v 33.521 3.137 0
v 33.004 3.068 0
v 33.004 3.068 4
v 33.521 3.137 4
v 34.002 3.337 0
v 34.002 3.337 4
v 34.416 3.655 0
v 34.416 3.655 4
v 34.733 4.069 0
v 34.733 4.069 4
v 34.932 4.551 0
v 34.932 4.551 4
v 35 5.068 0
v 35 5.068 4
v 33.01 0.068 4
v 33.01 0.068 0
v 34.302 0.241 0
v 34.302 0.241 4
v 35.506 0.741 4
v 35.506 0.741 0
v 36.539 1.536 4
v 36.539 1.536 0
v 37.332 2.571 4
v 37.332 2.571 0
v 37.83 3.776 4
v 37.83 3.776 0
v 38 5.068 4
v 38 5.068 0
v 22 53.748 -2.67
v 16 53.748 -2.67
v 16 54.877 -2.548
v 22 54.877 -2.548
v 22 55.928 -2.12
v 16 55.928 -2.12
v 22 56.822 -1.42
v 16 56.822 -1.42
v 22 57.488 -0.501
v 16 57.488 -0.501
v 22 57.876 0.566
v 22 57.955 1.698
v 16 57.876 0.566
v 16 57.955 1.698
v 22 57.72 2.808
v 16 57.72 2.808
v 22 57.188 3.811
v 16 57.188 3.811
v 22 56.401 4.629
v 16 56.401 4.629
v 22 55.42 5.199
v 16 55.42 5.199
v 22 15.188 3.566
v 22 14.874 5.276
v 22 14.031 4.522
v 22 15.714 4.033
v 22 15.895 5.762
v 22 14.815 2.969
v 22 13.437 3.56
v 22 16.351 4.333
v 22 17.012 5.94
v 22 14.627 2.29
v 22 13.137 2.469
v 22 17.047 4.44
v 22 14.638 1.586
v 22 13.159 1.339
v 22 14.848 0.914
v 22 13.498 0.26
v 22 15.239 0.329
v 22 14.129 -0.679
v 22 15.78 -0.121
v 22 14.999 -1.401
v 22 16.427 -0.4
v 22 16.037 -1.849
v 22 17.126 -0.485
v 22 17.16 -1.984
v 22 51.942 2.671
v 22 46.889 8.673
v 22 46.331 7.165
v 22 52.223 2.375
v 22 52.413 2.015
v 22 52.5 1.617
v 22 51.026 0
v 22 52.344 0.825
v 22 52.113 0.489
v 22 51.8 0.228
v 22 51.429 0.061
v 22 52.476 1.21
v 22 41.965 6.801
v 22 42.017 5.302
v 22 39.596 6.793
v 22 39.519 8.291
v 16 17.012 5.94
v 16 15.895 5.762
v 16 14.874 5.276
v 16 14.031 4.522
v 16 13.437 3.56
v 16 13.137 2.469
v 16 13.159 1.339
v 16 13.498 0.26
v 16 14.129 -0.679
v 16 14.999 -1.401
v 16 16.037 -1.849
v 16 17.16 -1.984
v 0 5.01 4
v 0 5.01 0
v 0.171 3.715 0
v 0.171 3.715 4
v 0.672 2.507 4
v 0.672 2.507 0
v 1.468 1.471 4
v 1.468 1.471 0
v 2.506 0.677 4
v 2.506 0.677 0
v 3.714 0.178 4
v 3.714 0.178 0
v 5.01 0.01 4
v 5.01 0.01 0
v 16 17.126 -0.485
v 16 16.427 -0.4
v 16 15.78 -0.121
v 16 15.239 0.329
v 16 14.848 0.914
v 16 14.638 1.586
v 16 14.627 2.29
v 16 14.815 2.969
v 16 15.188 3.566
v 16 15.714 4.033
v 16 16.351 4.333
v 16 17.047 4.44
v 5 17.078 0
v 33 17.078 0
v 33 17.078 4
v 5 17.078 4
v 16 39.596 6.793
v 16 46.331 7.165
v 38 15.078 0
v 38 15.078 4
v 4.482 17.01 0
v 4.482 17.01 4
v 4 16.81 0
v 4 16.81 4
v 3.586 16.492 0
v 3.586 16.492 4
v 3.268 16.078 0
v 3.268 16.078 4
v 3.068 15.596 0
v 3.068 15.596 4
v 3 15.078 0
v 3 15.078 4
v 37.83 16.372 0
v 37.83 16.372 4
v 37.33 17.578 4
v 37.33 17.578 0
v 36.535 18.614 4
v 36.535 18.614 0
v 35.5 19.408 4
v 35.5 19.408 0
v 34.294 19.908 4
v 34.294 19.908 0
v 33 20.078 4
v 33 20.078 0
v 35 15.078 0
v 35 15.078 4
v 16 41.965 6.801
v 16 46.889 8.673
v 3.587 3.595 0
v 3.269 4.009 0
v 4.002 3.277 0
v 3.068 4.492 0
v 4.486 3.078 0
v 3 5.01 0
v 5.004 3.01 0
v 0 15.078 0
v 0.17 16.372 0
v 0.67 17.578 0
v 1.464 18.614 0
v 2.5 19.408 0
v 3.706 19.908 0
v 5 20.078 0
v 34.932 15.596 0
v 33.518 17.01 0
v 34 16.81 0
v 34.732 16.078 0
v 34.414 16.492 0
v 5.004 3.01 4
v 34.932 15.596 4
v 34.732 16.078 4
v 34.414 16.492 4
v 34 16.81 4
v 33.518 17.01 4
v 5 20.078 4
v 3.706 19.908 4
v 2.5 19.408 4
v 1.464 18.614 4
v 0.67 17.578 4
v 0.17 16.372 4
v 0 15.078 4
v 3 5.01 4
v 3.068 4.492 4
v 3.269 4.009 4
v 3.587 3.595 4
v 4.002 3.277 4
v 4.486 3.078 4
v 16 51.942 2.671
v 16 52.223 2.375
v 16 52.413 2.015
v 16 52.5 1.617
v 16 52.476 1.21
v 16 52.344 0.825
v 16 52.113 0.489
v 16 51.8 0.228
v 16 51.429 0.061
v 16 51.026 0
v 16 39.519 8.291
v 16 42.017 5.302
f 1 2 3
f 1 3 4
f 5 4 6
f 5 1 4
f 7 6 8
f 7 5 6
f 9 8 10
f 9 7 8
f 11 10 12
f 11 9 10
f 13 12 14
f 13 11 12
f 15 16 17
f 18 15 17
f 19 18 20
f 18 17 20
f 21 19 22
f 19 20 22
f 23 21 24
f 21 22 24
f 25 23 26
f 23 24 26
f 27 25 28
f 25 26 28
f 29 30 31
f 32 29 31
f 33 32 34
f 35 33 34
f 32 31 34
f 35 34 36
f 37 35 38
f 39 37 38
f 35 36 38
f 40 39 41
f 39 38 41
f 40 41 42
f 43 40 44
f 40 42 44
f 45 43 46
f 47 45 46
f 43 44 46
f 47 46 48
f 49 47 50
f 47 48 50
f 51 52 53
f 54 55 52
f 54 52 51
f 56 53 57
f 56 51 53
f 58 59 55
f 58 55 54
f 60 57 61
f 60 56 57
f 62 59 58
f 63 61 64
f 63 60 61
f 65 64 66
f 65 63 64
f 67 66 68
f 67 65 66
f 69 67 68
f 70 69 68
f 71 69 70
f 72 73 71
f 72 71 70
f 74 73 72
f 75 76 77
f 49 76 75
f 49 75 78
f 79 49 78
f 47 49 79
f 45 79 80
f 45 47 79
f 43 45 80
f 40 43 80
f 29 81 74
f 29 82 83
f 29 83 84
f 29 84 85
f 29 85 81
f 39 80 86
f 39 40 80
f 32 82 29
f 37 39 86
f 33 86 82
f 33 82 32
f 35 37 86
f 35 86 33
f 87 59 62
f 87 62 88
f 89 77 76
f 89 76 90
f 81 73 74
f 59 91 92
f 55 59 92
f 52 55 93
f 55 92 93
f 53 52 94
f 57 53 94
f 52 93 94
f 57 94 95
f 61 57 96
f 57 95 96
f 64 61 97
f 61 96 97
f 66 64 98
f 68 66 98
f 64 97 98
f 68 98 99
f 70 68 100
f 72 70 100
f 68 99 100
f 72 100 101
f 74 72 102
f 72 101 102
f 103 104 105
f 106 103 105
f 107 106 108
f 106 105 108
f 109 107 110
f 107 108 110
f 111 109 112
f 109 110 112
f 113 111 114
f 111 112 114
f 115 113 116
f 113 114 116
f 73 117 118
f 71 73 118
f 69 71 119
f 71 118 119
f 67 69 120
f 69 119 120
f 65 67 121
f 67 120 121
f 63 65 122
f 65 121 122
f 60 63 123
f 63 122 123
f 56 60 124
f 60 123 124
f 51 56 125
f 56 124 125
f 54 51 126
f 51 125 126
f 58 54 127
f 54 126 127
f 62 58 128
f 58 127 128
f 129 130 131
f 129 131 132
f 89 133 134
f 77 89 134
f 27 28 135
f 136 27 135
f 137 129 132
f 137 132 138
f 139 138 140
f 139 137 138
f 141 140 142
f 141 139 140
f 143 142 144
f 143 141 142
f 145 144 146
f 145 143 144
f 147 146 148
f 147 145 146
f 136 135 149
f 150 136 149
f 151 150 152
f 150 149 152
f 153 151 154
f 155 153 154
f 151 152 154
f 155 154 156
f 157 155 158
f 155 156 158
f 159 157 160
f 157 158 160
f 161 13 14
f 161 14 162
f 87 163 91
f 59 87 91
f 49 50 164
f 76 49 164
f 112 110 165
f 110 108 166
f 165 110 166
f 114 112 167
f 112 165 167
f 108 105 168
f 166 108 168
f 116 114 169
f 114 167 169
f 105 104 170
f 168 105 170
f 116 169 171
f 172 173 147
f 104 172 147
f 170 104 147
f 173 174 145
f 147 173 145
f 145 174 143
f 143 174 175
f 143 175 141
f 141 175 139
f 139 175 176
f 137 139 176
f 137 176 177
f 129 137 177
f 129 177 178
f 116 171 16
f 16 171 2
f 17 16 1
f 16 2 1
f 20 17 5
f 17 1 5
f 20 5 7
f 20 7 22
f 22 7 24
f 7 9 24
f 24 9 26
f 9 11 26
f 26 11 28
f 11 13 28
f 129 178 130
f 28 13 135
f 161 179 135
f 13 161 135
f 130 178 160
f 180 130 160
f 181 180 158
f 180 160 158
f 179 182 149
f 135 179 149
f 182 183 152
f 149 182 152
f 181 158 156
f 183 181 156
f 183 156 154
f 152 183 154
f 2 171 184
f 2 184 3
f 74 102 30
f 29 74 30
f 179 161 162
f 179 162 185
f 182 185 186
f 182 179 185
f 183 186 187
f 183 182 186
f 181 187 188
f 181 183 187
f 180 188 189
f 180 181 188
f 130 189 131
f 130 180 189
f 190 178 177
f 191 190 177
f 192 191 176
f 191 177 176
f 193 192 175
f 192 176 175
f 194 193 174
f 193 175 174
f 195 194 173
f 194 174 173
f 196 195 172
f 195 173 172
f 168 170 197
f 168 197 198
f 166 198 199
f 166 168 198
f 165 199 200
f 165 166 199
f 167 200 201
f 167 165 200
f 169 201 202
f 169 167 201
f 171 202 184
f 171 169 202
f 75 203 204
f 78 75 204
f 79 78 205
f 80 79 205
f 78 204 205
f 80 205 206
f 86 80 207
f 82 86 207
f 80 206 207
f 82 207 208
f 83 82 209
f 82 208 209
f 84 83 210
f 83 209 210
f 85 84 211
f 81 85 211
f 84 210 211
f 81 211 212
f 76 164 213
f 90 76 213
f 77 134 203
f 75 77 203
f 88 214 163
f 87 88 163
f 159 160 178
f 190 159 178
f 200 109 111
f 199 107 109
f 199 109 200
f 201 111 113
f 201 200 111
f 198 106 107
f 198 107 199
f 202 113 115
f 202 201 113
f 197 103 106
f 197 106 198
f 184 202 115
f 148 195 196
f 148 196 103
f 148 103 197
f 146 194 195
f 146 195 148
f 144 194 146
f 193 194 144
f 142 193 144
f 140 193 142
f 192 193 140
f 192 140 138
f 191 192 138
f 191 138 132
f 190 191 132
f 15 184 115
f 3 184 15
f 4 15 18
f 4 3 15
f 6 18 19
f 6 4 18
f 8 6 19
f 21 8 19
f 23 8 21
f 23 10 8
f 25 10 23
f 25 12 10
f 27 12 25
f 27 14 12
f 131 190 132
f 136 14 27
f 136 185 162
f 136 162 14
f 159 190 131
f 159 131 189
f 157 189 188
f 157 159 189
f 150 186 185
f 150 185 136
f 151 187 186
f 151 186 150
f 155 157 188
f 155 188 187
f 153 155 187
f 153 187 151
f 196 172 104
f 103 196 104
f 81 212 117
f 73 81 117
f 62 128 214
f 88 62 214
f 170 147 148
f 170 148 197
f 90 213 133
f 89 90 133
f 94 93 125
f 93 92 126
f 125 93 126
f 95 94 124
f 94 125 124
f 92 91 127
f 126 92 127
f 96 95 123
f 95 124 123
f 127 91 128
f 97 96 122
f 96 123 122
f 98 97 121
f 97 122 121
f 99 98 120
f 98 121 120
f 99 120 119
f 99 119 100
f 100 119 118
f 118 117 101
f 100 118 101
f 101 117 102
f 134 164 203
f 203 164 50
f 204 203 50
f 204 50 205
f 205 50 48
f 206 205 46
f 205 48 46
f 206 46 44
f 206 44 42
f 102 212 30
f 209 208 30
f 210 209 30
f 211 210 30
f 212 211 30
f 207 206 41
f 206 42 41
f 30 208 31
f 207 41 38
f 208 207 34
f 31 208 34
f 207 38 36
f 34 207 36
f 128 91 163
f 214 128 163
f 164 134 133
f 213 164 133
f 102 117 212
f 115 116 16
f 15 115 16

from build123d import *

# Parameters (mm, degrees)
EXTRUSION1_DEPTH      = 4
EXTRUSION6_DEPTH      = 3
EXTRUSION6_DEPTH_BACK = 3


with BuildPart() as part:
    # Esquisse1 → Extrusion1 (new body)
    with BuildSketch(Plane.XY):
        with BuildLine():
            Line((5.010293101, 0.010314313), (33.010212581, 0.067955638))
            ThreePointArc((33.010212581, 0.067955638), (36.539090675, 1.536052173), (37.999919479, 5.067945043))
            Line((37.999919479, 5.067945043), (37.999919479, 15.078227571))
            ThreePointArc((37.999919479, 15.078227571), (36.535453385, 18.613761477), (32.999919479, 20.078227571))
            Line((32.999919479, 20.078227571), (5, 20.078227571))
            ThreePointArc((5, 20.078227571), (1.464466094, 18.613761477), (0, 15.078227571))
            Line((0, 15.078227571), (0, 5.010303718))
            ThreePointArc((0, 5.010303718), (1.46810713, 1.471132522), (5.010293101, 0.010314313))
        make_face()
        with BuildLine():
            Line((5.004117241, 3.010307956), (33.00403672, 3.067949281))
            ThreePointArc((33.00403672, 3.067949281), (34.415587958, 3.655187895), (34.999919479, 5.067945043))
            Line((34.999919479, 5.067945043), (34.999919479, 15.078227571))
            ThreePointArc((34.999919479, 15.078227571), (34.414133042, 16.492441133), (32.999919479, 17.078227571))
            Line((32.999919479, 17.078227571), (5, 17.078227571))
            ThreePointArc((5, 17.078227571), (3.585786438, 16.492441133), (3, 15.078227571))
            Line((3, 15.078227571), (3, 5.010303718))
            ThreePointArc((3, 5.010303718), (3.587242852, 3.59463524), (5.004117241, 3.010307956))
        make_face(mode=Mode.SUBTRACT)
    extrude(amount=EXTRUSION1_DEPTH)


with BuildPart() as body_2:
    # Esquisse3 → Extrusion6 (new, two sides: drawn at the far end of the back side and taken through both)
    with BuildSketch(Plane(origin=(18.99995974, 0, 0), x_dir=(0, 0, -1), z_dir=(1, 0, 0)).offset(-EXTRUSION6_DEPTH_BACK)):
        with BuildLine():
            Line((-4.439973035, 17.04696415), (-5.301833954, 42.016529803))
            Line((-5.301833954, 42.016529803), (-6.800941213, 41.964785933))
            Line((-6.800941213, 41.964785933), (-5.939658597, 17.011974715))
            ThreePointArc((-5.939658597, 17.011974715), (-1.903276121, 13.107411753), (1.984447776, 17.160015646))
            Line((1.984447776, 17.160015646), (2.669598886, 53.748061856))
            ThreePointArc((2.669598886, 53.748061856), (-0.565594436, 57.875653406), (-5.199339475, 55.419661805))
            Line((-5.199339475, 55.419661805), (-8.673308706, 46.888957693))
            Line((-8.673308706, 46.888957693), (-8.291007805, 39.51874277))
            Line((-8.291007805, 39.51874277), (-6.793021698, 39.596444905))
            Line((-6.793021698, 39.596444905), (-7.164629397, 46.331105448))
            Line((-7.164629397, 46.331105448), (-2.67078462, 51.942044927))
            ThreePointArc((-2.67078462, 51.942044927), (-1.013234058, 52.423177555), (-0.000153484, 51.025812098))
            Line((-0.000153484, 51.025812098), (0.484839133, 17.125753187))
            ThreePointArc((0.484839133, 17.125753187), (-1.937901786, 14.60703548), (-4.439973035, 17.04696415))
        make_face()
    extrude(amount=EXTRUSION6_DEPTH + EXTRUSION6_DEPTH_BACK)


solid = Compound([part.part, body_2.part])
